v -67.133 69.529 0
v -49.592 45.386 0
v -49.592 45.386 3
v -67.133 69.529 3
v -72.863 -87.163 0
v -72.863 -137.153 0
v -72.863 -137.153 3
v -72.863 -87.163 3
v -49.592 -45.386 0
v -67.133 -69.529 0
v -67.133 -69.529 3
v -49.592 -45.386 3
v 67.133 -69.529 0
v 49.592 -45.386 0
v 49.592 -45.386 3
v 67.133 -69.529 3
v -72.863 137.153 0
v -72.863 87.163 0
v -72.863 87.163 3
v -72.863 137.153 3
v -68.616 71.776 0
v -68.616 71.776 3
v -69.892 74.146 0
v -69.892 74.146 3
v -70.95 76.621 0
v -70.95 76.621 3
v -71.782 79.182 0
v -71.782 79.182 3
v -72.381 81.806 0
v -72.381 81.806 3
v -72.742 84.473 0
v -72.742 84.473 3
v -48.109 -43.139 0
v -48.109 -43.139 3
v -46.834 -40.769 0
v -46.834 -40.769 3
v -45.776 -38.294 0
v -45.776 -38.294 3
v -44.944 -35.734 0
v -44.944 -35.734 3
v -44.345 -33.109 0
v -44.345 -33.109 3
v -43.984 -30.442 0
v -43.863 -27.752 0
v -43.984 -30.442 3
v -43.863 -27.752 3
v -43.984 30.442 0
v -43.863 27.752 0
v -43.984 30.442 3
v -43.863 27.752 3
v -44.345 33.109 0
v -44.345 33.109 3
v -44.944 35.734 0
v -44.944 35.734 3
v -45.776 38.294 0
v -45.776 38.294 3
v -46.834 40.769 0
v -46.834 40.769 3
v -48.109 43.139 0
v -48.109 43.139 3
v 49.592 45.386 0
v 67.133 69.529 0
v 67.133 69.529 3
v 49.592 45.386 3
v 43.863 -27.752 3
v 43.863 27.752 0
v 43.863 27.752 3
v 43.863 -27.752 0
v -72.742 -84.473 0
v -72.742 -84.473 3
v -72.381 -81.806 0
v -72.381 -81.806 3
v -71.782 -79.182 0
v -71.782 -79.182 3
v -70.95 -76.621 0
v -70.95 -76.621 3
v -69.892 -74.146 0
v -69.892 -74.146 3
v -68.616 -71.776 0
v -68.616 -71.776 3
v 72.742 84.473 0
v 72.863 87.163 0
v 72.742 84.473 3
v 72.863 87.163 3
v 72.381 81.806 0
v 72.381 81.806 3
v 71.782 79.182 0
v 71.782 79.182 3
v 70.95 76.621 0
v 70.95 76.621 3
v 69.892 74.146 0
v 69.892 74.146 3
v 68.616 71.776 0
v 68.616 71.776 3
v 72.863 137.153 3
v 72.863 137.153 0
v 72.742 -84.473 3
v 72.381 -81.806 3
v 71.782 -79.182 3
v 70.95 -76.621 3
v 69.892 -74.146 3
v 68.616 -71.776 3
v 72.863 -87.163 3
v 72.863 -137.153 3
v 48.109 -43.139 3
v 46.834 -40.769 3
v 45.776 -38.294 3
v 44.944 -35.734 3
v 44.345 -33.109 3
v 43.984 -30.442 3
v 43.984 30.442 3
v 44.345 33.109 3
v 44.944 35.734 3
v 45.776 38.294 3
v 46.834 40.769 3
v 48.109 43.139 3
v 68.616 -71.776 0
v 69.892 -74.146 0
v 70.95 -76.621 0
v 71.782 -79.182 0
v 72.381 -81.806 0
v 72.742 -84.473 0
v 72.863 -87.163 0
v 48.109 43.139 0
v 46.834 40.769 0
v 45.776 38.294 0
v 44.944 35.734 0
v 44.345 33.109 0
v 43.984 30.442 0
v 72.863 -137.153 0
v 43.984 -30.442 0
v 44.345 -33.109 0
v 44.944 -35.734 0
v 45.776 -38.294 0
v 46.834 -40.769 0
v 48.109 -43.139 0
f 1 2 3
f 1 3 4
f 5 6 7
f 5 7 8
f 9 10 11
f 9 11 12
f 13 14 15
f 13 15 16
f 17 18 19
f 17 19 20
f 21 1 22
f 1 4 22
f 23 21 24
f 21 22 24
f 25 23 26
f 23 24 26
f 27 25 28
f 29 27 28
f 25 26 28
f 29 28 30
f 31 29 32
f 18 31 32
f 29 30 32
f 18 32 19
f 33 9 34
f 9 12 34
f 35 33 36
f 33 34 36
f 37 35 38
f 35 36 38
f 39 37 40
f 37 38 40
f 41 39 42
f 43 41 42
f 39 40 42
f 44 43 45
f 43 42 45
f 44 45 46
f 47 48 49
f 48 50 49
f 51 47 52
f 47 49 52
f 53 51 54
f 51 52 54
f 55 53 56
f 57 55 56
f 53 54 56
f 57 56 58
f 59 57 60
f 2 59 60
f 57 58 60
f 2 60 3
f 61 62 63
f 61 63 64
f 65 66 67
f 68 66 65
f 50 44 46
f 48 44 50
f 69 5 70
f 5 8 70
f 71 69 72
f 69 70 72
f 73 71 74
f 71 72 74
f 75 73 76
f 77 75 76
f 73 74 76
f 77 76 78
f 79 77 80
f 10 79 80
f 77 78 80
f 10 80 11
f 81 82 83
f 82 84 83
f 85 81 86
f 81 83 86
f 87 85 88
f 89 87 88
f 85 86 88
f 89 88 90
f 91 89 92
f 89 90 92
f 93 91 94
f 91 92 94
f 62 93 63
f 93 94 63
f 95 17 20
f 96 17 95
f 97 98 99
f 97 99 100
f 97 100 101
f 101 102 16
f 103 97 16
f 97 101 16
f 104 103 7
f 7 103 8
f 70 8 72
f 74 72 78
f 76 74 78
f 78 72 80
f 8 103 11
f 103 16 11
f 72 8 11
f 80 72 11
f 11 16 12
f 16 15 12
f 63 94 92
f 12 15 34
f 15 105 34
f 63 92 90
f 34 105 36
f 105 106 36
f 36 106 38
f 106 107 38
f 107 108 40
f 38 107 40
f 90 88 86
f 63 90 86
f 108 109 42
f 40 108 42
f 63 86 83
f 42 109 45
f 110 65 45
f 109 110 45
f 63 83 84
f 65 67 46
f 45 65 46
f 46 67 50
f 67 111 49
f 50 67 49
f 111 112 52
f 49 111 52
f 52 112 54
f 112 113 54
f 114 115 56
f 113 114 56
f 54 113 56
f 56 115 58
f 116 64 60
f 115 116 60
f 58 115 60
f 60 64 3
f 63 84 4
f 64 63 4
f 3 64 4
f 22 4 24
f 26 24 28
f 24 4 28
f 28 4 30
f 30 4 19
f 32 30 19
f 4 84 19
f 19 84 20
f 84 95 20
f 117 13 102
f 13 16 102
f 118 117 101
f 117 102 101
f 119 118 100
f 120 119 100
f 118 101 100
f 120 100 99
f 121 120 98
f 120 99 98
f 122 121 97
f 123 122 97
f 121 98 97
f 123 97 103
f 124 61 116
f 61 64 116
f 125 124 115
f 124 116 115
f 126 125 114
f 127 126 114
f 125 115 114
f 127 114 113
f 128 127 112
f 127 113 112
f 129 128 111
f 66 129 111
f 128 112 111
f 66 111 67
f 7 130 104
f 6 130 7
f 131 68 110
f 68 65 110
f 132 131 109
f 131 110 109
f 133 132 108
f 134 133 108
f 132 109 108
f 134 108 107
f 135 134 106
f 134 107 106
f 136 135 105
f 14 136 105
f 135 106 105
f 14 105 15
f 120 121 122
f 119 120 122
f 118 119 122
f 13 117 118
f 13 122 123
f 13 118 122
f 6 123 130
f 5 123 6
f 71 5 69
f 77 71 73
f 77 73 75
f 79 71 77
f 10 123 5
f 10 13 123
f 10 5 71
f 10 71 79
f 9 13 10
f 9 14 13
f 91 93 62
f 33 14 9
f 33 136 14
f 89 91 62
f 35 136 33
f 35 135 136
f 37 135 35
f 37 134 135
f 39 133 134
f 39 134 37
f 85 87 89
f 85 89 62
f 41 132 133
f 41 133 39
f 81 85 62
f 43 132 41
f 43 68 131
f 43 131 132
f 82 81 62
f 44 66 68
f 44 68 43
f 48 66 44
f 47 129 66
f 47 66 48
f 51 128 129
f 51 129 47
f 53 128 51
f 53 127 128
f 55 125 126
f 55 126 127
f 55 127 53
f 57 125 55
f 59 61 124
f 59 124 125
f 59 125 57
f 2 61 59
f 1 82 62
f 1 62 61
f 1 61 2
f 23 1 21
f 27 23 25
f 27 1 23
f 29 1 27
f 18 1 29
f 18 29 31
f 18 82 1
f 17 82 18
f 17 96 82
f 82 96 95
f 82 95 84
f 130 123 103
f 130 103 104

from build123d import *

# Parameters (mm, degrees)
SALIENTE_EXTRUIR1_DEPTH = 3
REDONDEO1_R             = 30


with BuildPart() as part:
    # Croquis1 → Saliente-Extruir1 (new body)
    with BuildSketch(Plane.XY):
        Polygon((72.862780289, -137.153468779), (-72.862780289, -137.153468779), (-72.862780289, -77.415075694), (-43.862780289, -37.5), (-43.862780289, 37.5), (-72.862780289, 77.415075694), (-72.862780289, 137.153468779), (72.862780289, 137.153468779), (72.862780289, 77.415075694), (43.862780289, 37.5), (43.862780289, -37.5), (72.862780289, -77.415075694), align=None)
    extrude(amount=SALIENTE_EXTRUIR1_DEPTH)

    # Redondeo1
    redondeo1_edges = [part.edges().sort_by_distance(p)[0] for p in [
        (72.862780289, 77.415075694, 1.5),
        (43.862780289, 37.5, 1.5),
        (43.862780289, -37.5, 1.5),
        (72.862780289, -77.415075694, 1.5),
        (-72.862780289, -77.415075694, 1.5),
        (-43.862780289, -37.5, 1.5),
        (-43.862780289, 37.5, 1.5),
        (-72.862780289, 77.415075694, 1.5),
    ]]
    fillet(redondeo1_edges, radius=REDONDEO1_R)


solid = part.part
